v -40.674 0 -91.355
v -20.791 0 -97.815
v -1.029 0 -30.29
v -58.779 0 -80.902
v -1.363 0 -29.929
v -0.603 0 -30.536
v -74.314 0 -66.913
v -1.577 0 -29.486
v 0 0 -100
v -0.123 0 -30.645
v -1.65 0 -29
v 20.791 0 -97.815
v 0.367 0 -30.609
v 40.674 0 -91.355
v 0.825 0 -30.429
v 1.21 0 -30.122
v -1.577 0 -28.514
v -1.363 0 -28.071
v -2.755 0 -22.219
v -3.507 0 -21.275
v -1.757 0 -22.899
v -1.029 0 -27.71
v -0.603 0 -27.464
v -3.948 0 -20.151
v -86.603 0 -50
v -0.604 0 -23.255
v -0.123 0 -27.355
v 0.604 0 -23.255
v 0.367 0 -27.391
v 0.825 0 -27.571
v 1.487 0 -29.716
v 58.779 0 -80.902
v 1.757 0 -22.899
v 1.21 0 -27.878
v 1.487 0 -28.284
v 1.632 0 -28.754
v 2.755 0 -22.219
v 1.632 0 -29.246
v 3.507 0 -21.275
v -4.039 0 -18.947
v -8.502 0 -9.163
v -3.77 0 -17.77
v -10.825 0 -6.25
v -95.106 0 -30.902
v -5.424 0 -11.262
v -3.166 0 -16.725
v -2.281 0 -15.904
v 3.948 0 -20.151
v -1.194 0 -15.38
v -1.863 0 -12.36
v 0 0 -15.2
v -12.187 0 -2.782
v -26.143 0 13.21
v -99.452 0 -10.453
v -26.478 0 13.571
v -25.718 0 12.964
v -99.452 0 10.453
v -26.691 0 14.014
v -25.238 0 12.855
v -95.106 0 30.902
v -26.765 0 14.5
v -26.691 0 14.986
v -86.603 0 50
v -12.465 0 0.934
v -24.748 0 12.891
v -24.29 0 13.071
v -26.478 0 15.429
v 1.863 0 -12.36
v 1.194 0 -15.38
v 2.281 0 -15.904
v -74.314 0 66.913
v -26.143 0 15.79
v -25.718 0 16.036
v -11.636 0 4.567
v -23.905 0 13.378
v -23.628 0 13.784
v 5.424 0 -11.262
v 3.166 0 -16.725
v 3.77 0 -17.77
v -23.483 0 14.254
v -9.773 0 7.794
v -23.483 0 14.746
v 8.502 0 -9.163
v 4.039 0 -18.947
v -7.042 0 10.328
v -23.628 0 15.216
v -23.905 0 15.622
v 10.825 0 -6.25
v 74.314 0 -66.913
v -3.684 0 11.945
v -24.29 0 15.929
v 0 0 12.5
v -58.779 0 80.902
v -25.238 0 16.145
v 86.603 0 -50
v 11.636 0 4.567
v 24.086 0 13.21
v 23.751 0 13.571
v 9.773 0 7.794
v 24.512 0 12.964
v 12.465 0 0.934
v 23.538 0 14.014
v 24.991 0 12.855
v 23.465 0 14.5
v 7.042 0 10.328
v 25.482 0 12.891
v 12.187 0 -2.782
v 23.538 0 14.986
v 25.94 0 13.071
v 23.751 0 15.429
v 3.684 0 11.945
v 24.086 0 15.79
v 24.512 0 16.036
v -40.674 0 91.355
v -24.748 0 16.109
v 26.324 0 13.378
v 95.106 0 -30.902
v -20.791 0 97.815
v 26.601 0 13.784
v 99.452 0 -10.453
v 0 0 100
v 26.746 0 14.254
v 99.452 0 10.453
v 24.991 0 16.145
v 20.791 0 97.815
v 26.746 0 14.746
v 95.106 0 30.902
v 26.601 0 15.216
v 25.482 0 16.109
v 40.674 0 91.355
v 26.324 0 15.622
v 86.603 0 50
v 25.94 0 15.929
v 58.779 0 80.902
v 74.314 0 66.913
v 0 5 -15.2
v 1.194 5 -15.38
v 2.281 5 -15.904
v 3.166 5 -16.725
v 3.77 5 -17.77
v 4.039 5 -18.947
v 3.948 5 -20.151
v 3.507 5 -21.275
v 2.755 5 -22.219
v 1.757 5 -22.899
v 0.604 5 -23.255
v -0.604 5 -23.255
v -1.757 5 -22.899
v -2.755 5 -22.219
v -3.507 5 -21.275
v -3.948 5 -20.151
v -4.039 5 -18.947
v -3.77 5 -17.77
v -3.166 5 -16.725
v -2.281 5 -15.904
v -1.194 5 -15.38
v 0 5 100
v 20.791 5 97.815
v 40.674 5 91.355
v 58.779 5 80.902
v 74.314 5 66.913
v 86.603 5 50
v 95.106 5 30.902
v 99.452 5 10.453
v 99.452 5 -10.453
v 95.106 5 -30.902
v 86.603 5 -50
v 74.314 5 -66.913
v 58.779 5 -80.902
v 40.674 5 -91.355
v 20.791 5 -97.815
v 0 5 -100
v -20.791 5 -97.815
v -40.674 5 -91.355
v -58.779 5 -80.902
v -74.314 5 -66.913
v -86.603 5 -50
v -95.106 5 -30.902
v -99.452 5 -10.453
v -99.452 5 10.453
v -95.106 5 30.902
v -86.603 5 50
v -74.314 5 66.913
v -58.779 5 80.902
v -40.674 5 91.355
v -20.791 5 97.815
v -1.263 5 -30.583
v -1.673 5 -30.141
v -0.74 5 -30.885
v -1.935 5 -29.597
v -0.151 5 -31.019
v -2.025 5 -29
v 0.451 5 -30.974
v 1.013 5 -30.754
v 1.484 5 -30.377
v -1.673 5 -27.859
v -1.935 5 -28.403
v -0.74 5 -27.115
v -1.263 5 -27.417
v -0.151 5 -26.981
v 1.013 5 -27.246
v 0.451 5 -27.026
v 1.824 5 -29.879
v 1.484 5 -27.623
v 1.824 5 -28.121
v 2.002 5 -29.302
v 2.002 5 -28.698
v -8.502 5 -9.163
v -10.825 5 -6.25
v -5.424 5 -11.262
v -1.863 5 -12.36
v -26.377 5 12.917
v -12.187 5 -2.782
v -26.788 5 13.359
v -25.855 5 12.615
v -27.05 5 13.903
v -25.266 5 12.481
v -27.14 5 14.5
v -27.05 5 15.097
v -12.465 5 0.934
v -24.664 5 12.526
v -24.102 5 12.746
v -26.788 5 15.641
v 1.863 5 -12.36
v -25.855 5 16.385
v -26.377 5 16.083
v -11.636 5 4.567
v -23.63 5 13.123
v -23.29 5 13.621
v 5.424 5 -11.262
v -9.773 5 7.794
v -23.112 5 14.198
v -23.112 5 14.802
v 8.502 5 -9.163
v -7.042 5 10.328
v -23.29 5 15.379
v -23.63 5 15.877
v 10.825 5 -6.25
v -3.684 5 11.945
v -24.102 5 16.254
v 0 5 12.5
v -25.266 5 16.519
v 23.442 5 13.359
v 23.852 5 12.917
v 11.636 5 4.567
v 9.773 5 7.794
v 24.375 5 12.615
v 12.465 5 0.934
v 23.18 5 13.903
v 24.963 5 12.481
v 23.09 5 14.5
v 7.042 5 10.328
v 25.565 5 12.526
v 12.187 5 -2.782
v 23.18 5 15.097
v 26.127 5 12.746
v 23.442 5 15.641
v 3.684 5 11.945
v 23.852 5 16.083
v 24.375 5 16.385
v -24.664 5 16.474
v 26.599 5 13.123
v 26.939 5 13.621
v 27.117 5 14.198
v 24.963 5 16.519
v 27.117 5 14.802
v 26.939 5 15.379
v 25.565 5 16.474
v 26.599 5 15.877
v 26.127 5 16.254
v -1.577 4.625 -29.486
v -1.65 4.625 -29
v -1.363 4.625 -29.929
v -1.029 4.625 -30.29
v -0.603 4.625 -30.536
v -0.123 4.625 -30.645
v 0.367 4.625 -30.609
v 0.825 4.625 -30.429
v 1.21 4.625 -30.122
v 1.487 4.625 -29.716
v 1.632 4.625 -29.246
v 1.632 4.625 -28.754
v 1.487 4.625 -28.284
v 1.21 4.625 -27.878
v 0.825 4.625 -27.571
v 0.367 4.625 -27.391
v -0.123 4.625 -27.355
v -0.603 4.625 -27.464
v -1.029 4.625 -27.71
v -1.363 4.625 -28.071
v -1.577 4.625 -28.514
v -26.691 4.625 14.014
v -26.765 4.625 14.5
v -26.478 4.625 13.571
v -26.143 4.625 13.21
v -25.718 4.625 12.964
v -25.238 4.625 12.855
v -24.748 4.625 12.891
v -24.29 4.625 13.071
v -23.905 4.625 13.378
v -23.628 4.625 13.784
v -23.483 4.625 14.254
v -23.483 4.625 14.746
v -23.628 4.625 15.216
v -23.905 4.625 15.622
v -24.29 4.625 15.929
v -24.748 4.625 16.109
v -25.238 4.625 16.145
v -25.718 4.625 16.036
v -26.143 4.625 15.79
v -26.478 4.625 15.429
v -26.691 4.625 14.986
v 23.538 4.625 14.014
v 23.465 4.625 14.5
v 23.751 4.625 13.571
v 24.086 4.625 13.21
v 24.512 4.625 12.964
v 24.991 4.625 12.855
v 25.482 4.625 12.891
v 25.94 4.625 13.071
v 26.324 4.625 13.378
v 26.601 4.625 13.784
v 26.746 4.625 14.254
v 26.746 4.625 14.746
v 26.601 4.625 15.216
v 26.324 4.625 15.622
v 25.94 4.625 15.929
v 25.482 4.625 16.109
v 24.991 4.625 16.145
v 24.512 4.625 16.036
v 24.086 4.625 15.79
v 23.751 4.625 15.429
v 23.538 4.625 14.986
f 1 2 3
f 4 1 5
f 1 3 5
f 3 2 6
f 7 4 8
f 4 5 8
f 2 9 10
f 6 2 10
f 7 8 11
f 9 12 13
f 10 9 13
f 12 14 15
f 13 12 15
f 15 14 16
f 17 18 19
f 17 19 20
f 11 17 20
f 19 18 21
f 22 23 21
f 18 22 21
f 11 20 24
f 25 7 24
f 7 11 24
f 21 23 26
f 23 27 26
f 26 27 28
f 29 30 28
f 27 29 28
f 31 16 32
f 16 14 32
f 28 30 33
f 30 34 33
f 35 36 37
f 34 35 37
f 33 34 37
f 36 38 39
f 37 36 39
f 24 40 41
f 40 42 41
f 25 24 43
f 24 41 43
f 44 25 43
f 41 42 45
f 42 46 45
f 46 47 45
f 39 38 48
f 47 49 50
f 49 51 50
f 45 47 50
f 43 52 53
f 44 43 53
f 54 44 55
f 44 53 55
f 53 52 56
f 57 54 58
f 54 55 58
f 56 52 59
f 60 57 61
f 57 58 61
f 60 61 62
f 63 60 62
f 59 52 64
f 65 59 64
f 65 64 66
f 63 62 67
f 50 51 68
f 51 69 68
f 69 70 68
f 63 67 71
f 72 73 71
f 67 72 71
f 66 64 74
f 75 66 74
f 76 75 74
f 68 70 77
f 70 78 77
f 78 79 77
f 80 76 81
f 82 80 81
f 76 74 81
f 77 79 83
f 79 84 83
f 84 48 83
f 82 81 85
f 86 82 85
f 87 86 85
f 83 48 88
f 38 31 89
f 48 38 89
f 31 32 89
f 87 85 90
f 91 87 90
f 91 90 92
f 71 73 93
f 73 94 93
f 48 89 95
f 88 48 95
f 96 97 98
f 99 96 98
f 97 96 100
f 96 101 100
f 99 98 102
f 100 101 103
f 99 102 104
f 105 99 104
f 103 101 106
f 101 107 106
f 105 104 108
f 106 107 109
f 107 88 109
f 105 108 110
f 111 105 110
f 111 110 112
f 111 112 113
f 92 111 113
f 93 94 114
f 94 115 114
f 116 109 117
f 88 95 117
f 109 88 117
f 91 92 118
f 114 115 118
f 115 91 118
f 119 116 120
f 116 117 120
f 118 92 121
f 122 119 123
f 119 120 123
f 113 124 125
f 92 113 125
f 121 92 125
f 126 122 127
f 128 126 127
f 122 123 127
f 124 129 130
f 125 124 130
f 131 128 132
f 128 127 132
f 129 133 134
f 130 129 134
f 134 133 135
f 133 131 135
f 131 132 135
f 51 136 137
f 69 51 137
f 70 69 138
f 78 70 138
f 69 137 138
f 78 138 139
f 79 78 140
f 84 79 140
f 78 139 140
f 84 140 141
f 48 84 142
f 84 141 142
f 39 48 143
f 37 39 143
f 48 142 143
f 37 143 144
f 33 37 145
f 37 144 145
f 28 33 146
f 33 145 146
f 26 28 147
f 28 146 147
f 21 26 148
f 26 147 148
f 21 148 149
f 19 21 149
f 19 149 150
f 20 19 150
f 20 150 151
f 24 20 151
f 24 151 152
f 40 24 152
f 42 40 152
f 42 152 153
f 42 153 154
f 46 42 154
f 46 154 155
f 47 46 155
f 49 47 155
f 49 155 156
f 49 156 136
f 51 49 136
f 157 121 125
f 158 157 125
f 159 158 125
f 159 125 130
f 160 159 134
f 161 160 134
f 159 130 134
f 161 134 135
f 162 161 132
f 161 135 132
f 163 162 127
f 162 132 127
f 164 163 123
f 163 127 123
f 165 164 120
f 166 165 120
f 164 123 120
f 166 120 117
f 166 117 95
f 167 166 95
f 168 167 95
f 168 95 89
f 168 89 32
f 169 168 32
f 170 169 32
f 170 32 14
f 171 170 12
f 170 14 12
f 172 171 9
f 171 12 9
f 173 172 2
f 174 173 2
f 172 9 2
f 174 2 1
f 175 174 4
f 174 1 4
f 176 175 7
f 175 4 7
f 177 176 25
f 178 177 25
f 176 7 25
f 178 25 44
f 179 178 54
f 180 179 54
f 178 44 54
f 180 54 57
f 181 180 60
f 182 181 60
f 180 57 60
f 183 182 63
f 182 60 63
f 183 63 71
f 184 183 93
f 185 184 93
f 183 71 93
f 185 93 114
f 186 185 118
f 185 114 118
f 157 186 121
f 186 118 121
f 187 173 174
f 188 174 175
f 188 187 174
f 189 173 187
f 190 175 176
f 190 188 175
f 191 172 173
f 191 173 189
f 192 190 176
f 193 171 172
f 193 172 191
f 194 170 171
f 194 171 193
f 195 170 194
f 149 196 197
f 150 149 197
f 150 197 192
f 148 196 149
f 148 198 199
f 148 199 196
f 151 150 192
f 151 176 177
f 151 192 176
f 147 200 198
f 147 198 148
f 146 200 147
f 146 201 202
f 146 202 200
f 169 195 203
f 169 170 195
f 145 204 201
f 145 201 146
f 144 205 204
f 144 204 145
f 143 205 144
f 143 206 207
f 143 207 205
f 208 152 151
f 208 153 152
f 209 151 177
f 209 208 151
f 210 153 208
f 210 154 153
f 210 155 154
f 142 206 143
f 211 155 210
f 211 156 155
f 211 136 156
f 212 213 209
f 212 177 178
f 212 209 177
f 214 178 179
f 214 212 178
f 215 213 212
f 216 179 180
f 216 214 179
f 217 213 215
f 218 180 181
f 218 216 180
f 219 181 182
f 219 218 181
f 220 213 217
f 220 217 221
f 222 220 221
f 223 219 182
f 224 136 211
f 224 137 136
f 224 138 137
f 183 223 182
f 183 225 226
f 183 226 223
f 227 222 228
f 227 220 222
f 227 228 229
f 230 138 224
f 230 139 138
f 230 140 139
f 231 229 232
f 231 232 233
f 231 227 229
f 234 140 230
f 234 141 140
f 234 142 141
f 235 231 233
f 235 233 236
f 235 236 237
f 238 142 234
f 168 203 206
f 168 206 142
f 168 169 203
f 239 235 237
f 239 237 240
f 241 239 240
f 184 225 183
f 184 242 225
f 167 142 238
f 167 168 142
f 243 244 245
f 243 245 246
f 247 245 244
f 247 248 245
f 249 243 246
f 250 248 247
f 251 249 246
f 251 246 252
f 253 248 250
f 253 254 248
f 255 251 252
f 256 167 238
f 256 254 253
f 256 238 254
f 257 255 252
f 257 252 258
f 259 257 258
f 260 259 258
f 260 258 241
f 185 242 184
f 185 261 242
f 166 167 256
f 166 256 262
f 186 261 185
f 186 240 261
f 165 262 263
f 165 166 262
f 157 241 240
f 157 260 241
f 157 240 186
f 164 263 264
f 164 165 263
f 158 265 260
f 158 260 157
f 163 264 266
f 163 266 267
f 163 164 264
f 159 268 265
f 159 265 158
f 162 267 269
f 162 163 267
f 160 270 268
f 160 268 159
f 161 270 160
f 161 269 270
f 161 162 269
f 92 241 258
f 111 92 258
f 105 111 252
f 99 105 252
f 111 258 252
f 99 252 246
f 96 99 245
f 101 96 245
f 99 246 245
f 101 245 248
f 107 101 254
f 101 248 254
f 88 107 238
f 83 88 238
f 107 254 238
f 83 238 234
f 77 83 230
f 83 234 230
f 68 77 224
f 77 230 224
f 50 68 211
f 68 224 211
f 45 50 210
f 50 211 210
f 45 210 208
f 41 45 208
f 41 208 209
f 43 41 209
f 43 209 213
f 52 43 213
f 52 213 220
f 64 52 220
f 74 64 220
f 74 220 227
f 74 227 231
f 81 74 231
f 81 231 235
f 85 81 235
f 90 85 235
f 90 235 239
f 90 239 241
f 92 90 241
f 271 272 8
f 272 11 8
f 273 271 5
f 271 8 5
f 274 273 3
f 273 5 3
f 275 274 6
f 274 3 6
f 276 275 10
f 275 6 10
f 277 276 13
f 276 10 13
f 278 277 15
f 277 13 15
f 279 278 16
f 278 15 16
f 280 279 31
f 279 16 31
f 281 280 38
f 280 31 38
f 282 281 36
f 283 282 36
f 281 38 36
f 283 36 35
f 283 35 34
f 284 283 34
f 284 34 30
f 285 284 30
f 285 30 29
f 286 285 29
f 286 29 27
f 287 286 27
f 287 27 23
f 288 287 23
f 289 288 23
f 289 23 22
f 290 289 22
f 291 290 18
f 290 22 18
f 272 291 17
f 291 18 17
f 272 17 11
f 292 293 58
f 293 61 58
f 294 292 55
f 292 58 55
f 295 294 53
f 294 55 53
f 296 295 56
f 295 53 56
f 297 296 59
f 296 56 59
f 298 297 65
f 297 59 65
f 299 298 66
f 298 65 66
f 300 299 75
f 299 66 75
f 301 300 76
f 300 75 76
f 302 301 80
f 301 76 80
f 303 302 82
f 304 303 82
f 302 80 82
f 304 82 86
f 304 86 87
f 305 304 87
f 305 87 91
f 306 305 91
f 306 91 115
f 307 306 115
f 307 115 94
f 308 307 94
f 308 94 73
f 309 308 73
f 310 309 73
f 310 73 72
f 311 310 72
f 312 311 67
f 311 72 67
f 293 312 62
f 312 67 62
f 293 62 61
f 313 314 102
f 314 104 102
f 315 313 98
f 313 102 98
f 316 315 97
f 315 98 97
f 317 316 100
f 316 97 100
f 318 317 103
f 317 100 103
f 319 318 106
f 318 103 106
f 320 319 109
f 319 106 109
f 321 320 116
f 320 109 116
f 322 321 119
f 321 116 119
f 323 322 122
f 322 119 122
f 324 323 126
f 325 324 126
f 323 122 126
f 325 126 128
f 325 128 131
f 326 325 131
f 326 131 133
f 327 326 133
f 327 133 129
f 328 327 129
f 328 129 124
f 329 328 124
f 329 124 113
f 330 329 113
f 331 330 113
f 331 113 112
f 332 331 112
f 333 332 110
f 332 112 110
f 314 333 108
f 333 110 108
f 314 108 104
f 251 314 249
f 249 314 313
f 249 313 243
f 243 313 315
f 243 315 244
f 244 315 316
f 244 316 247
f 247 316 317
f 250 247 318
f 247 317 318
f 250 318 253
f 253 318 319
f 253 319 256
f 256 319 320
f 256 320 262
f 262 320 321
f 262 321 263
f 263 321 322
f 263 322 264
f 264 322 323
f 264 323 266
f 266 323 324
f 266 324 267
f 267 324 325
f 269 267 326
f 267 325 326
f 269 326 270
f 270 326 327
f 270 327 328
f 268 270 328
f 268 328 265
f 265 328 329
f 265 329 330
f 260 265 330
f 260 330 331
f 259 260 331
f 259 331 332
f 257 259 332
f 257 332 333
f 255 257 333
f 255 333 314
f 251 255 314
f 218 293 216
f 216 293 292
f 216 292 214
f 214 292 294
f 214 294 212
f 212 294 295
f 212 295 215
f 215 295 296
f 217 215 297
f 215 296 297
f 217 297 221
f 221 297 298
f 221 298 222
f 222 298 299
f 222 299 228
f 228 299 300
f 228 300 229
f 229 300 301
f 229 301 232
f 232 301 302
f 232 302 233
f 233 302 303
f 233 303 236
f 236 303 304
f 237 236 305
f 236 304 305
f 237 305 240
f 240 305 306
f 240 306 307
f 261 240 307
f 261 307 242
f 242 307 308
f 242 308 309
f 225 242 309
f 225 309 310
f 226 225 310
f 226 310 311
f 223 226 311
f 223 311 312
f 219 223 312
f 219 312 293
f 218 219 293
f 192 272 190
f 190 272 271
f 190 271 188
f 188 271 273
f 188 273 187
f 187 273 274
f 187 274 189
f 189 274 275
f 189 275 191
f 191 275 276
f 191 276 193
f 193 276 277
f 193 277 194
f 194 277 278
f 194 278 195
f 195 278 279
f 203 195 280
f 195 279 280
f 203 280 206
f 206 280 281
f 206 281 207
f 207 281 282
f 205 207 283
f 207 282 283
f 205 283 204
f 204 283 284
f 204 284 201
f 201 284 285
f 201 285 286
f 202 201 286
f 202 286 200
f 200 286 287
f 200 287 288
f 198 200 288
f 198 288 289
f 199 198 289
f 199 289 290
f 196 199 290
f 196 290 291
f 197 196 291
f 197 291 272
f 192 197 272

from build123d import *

# Parameters (mm, degrees)
SKETCH_1_R                   = 100
EXTRUDE_1_DEPTH              = 5
CUT_EXTRUDE_1_REACH          = 143.51
SKETCH_2_R                   = 12.5
SKETCH_2_R_2                 = 4.05
HOLE_WIZARD_M4_1_D           = 3.3
HOLE_WIZARD_M4_1_CSINK_D     = 4.05
HOLE_WIZARD_M4_1_CSINK_ANGLE = 90


with BuildPart() as part:
    # 草图1 → 凸台-拉伸1 (new body)
    with BuildSketch(Plane(origin=(0, 0, 0), x_dir=(1, 0, 0), z_dir=(0, 1, 0))):
        with Locations(Location((0, 0, 0), (0, 0, 270))):
            Circle(SKETCH_1_R)
    extrude(amount=EXTRUDE_1_DEPTH)

    # 草图2 → 切除-拉伸1 (cut, up to next)
    with BuildSketch(Plane(origin=(0, 5, 0), x_dir=(1, 0, 0), z_dir=(0, 1, 0)), mode=Mode.PRIVATE) as cut_extrude_1_sk1:
        with Locations(Location((0, 0, 0), (0, 0, 270))):
            Circle(SKETCH_2_R)
    cut_extrude_1_tool1 = extrude(cut_extrude_1_sk1.sketch, amount=-CUT_EXTRUDE_1_REACH, mode=Mode.PRIVATE) & part.part
    # 草图2 → 切除-拉伸1 (cut, up to next)
    with BuildSketch(Plane(origin=(0, 5, 0), x_dir=(1, 0, 0), z_dir=(0, 1, 0)), mode=Mode.PRIVATE) as cut_extrude_1_sk2:
        with Locations(Location((0, 19.25, 0), (0, 0, 270))):
            Circle(SKETCH_2_R_2)
    cut_extrude_1_tool2 = extrude(cut_extrude_1_sk2.sketch, amount=-CUT_EXTRUDE_1_REACH, mode=Mode.PRIVATE) & part.part
    add(cut_extrude_1_tool1.solids().sort_by_distance((0, 5, 0))[0], mode=Mode.SUBTRACT)
    add(cut_extrude_1_tool2.solids().sort_by_distance((0, 5, -19.25))[0], mode=Mode.SUBTRACT)

    # M4 螺纹孔1 (through all)
    with Locations(Plane(origin=(0, 5, 0), x_dir=(1, 0, 0), z_dir=(0, 1, 0))):
        with Locations((25.11473671, -14.5), (0, 29), (-25.11473671, -14.5)):
            CounterSinkHole(HOLE_WIZARD_M4_1_D / 2, HOLE_WIZARD_M4_1_CSINK_D / 2, counter_sink_angle=HOLE_WIZARD_M4_1_CSINK_ANGLE)


solid = part.part
